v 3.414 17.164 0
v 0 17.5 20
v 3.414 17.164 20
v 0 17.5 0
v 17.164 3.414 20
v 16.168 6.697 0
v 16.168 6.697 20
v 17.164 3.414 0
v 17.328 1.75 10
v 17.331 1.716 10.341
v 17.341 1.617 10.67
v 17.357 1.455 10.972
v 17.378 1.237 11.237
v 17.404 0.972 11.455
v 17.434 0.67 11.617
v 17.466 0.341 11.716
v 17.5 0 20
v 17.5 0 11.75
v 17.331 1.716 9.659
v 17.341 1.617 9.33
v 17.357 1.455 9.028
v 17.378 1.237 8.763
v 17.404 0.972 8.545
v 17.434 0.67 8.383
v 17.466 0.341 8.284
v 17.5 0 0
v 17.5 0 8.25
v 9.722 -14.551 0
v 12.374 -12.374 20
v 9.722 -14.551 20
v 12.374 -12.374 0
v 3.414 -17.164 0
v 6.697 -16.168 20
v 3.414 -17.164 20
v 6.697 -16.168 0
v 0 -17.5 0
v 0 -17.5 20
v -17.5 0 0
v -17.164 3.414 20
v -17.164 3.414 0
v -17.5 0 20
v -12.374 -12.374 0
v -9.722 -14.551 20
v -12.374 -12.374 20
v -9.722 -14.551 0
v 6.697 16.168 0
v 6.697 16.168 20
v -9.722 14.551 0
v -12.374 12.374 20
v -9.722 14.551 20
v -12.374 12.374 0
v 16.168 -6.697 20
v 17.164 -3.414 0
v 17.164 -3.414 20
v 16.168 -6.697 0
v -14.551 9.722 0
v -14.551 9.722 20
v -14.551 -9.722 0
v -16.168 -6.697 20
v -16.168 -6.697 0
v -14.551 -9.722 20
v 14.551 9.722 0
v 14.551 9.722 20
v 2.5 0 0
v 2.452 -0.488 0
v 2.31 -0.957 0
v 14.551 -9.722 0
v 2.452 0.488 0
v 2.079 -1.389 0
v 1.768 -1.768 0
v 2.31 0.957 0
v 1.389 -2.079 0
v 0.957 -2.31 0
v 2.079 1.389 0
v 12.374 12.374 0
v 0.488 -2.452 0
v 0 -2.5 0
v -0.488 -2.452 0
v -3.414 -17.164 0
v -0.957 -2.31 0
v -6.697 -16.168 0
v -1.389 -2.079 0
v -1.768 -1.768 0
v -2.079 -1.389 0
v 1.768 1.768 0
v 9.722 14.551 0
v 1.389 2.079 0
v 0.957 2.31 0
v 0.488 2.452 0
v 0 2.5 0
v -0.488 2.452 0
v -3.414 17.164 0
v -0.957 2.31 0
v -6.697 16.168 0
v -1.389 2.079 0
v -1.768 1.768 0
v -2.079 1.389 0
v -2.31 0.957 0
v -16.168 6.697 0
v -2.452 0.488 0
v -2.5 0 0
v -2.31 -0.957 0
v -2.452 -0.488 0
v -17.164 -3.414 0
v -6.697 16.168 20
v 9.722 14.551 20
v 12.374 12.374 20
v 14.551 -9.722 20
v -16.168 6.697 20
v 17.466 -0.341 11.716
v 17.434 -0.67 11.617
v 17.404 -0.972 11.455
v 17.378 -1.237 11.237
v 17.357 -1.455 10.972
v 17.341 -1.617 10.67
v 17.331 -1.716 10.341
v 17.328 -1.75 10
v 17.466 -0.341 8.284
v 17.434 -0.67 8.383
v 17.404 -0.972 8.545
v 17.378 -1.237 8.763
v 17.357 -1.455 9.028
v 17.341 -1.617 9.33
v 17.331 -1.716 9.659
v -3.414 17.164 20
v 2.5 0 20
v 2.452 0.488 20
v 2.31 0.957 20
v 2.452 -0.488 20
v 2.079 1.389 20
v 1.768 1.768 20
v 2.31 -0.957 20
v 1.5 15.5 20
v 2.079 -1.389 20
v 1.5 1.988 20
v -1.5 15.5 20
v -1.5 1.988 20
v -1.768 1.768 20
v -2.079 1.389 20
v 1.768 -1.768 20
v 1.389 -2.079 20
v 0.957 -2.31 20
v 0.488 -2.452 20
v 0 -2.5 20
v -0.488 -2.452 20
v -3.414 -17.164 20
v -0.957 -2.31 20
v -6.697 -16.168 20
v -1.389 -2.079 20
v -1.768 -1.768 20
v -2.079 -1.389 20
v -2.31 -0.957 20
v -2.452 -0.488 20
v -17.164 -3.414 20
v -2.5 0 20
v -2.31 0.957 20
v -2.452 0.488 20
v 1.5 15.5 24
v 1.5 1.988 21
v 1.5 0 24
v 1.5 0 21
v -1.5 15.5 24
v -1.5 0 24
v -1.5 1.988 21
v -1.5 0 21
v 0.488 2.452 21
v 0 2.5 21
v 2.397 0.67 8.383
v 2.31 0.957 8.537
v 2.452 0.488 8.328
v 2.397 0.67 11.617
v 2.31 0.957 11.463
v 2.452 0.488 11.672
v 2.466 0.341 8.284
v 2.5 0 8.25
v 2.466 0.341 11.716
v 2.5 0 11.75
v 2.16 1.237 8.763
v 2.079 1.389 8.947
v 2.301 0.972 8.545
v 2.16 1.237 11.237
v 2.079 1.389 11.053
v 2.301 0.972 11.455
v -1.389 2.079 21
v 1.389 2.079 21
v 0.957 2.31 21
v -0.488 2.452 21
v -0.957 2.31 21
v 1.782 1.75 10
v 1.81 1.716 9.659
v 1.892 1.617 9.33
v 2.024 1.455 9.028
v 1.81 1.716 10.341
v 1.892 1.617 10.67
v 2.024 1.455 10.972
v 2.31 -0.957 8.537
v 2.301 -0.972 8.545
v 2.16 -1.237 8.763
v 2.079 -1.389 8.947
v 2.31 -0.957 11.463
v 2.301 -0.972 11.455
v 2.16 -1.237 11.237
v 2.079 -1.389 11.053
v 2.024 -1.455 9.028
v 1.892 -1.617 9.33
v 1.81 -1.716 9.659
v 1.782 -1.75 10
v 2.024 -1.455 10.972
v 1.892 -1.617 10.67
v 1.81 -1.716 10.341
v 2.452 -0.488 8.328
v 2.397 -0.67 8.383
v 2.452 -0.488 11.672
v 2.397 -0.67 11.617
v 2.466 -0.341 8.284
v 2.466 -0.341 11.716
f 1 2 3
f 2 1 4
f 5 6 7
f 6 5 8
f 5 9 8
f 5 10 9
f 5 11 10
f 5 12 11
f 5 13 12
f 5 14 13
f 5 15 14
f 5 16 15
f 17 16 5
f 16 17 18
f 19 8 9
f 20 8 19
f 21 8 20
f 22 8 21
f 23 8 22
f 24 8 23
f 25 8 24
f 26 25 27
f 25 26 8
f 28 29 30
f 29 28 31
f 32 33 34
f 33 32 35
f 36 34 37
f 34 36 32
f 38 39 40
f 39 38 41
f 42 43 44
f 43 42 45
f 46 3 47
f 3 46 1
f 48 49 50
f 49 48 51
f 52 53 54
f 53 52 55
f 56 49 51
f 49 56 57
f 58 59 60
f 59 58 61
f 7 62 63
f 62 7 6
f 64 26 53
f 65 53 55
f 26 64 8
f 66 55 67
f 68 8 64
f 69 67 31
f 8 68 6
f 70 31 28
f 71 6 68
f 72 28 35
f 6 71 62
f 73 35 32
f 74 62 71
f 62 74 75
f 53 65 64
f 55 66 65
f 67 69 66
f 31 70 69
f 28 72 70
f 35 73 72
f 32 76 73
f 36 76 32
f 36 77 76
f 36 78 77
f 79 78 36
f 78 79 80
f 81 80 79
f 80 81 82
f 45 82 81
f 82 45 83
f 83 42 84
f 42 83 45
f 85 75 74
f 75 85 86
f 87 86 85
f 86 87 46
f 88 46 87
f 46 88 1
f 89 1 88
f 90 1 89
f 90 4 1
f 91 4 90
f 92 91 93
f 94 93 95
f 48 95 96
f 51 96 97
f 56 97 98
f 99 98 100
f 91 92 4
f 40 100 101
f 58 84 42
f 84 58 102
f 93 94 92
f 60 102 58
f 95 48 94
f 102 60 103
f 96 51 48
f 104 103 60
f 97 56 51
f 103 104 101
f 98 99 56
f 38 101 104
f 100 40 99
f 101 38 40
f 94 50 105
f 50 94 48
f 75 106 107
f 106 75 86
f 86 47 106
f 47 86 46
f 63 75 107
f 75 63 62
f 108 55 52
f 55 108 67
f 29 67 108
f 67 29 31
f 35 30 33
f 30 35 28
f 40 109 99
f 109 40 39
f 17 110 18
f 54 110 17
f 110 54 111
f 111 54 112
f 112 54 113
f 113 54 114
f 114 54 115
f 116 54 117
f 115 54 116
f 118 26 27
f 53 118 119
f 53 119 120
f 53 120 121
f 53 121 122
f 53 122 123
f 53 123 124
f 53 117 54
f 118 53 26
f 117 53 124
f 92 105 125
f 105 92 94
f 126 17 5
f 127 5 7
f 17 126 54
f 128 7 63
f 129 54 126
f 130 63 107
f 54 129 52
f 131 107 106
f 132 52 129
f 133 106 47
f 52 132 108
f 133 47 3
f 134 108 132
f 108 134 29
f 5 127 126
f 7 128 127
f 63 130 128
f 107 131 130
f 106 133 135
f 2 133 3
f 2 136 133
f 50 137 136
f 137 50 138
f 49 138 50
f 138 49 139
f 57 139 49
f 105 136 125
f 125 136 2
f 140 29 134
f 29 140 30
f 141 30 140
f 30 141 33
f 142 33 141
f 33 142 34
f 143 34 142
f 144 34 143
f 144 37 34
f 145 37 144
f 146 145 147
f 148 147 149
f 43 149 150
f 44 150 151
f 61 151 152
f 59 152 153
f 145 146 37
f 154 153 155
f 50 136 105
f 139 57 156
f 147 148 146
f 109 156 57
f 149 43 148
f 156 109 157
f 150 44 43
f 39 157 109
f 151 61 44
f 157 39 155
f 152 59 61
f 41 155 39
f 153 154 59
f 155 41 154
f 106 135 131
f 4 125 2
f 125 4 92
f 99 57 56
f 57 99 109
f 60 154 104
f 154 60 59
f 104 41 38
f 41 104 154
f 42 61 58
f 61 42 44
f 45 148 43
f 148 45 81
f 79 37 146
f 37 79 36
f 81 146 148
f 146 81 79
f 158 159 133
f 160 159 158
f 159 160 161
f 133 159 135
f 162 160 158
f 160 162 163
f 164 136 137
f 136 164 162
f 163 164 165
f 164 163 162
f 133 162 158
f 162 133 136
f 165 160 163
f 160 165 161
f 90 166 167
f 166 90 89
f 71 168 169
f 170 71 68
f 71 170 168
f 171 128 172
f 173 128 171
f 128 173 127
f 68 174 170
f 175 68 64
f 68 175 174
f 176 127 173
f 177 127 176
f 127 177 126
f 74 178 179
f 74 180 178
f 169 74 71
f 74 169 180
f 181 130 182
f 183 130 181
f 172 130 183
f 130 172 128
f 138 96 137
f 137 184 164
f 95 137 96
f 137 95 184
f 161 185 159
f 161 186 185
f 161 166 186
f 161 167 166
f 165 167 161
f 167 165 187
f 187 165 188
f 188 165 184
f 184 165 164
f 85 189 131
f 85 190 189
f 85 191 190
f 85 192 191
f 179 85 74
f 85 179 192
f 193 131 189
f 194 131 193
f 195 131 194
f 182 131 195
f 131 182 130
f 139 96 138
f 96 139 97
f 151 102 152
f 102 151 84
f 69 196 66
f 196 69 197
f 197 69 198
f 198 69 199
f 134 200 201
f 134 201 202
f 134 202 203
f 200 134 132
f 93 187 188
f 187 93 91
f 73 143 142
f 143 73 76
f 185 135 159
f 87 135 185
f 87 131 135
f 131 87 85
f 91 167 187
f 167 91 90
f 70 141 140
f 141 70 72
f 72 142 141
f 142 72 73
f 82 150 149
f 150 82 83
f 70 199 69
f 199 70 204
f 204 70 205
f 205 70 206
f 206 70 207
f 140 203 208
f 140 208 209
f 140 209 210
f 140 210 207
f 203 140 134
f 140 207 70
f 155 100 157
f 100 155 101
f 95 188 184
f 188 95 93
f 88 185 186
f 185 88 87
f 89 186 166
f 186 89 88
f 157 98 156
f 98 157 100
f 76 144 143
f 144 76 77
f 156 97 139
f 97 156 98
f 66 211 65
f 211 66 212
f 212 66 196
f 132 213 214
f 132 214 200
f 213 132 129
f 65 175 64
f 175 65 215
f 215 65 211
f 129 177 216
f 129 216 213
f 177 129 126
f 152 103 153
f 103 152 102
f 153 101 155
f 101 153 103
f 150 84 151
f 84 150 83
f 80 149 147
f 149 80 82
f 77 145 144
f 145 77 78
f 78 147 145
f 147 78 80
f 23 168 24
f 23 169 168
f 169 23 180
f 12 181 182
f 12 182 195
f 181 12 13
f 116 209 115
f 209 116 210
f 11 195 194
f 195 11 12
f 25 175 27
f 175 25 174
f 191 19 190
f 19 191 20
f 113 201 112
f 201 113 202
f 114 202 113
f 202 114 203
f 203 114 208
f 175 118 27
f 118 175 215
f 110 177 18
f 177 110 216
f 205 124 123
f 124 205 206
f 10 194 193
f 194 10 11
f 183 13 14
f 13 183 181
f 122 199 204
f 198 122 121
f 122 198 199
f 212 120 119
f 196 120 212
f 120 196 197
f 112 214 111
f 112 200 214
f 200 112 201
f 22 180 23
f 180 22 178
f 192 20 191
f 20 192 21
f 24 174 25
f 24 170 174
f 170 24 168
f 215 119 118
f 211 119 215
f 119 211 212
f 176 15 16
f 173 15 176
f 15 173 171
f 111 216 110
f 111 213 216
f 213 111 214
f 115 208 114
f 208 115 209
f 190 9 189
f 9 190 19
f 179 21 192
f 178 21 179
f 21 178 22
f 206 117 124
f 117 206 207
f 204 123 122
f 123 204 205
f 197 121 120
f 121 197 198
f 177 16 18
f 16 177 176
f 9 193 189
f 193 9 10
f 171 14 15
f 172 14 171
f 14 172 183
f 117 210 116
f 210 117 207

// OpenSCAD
$fn = 32;
// target_bbox: 35, 35, 24
// ----------------------------------------------------------------------
// Control knob: pointer knob
// ----------------------------------------------------------------------

// --- parameters (mm) ---
rib_w = 3;                // pointer rib width
rib_h = 5;                // pointer rib height
knob_d = 35;              // knob body diameter
knob_h = 20;              // knob body height
bore_d = 5;               // shaft bore diameter
set_d = 3.5;              // set screw bore diameter

rib_poke = rib_h - 1;  // rib height above the top
total_h = knob_h + rib_h - 1;  // overall height

difference() {
  union() {
    cylinder(h = knob_h, d = knob_d);
    translate([-rib_w / 2, 0, knob_h - 1])
      cube([rib_w, knob_d / 2 - 2, rib_h]);
  }
  translate([0, 0, -1]) cylinder(h = knob_h + 2, d = bore_d);
  translate([-1, 0, knob_h / 2]) rotate([0, 90, 0])
    cylinder(h = knob_d / 2 + bore_d / 2 + 2, d = set_d);}
